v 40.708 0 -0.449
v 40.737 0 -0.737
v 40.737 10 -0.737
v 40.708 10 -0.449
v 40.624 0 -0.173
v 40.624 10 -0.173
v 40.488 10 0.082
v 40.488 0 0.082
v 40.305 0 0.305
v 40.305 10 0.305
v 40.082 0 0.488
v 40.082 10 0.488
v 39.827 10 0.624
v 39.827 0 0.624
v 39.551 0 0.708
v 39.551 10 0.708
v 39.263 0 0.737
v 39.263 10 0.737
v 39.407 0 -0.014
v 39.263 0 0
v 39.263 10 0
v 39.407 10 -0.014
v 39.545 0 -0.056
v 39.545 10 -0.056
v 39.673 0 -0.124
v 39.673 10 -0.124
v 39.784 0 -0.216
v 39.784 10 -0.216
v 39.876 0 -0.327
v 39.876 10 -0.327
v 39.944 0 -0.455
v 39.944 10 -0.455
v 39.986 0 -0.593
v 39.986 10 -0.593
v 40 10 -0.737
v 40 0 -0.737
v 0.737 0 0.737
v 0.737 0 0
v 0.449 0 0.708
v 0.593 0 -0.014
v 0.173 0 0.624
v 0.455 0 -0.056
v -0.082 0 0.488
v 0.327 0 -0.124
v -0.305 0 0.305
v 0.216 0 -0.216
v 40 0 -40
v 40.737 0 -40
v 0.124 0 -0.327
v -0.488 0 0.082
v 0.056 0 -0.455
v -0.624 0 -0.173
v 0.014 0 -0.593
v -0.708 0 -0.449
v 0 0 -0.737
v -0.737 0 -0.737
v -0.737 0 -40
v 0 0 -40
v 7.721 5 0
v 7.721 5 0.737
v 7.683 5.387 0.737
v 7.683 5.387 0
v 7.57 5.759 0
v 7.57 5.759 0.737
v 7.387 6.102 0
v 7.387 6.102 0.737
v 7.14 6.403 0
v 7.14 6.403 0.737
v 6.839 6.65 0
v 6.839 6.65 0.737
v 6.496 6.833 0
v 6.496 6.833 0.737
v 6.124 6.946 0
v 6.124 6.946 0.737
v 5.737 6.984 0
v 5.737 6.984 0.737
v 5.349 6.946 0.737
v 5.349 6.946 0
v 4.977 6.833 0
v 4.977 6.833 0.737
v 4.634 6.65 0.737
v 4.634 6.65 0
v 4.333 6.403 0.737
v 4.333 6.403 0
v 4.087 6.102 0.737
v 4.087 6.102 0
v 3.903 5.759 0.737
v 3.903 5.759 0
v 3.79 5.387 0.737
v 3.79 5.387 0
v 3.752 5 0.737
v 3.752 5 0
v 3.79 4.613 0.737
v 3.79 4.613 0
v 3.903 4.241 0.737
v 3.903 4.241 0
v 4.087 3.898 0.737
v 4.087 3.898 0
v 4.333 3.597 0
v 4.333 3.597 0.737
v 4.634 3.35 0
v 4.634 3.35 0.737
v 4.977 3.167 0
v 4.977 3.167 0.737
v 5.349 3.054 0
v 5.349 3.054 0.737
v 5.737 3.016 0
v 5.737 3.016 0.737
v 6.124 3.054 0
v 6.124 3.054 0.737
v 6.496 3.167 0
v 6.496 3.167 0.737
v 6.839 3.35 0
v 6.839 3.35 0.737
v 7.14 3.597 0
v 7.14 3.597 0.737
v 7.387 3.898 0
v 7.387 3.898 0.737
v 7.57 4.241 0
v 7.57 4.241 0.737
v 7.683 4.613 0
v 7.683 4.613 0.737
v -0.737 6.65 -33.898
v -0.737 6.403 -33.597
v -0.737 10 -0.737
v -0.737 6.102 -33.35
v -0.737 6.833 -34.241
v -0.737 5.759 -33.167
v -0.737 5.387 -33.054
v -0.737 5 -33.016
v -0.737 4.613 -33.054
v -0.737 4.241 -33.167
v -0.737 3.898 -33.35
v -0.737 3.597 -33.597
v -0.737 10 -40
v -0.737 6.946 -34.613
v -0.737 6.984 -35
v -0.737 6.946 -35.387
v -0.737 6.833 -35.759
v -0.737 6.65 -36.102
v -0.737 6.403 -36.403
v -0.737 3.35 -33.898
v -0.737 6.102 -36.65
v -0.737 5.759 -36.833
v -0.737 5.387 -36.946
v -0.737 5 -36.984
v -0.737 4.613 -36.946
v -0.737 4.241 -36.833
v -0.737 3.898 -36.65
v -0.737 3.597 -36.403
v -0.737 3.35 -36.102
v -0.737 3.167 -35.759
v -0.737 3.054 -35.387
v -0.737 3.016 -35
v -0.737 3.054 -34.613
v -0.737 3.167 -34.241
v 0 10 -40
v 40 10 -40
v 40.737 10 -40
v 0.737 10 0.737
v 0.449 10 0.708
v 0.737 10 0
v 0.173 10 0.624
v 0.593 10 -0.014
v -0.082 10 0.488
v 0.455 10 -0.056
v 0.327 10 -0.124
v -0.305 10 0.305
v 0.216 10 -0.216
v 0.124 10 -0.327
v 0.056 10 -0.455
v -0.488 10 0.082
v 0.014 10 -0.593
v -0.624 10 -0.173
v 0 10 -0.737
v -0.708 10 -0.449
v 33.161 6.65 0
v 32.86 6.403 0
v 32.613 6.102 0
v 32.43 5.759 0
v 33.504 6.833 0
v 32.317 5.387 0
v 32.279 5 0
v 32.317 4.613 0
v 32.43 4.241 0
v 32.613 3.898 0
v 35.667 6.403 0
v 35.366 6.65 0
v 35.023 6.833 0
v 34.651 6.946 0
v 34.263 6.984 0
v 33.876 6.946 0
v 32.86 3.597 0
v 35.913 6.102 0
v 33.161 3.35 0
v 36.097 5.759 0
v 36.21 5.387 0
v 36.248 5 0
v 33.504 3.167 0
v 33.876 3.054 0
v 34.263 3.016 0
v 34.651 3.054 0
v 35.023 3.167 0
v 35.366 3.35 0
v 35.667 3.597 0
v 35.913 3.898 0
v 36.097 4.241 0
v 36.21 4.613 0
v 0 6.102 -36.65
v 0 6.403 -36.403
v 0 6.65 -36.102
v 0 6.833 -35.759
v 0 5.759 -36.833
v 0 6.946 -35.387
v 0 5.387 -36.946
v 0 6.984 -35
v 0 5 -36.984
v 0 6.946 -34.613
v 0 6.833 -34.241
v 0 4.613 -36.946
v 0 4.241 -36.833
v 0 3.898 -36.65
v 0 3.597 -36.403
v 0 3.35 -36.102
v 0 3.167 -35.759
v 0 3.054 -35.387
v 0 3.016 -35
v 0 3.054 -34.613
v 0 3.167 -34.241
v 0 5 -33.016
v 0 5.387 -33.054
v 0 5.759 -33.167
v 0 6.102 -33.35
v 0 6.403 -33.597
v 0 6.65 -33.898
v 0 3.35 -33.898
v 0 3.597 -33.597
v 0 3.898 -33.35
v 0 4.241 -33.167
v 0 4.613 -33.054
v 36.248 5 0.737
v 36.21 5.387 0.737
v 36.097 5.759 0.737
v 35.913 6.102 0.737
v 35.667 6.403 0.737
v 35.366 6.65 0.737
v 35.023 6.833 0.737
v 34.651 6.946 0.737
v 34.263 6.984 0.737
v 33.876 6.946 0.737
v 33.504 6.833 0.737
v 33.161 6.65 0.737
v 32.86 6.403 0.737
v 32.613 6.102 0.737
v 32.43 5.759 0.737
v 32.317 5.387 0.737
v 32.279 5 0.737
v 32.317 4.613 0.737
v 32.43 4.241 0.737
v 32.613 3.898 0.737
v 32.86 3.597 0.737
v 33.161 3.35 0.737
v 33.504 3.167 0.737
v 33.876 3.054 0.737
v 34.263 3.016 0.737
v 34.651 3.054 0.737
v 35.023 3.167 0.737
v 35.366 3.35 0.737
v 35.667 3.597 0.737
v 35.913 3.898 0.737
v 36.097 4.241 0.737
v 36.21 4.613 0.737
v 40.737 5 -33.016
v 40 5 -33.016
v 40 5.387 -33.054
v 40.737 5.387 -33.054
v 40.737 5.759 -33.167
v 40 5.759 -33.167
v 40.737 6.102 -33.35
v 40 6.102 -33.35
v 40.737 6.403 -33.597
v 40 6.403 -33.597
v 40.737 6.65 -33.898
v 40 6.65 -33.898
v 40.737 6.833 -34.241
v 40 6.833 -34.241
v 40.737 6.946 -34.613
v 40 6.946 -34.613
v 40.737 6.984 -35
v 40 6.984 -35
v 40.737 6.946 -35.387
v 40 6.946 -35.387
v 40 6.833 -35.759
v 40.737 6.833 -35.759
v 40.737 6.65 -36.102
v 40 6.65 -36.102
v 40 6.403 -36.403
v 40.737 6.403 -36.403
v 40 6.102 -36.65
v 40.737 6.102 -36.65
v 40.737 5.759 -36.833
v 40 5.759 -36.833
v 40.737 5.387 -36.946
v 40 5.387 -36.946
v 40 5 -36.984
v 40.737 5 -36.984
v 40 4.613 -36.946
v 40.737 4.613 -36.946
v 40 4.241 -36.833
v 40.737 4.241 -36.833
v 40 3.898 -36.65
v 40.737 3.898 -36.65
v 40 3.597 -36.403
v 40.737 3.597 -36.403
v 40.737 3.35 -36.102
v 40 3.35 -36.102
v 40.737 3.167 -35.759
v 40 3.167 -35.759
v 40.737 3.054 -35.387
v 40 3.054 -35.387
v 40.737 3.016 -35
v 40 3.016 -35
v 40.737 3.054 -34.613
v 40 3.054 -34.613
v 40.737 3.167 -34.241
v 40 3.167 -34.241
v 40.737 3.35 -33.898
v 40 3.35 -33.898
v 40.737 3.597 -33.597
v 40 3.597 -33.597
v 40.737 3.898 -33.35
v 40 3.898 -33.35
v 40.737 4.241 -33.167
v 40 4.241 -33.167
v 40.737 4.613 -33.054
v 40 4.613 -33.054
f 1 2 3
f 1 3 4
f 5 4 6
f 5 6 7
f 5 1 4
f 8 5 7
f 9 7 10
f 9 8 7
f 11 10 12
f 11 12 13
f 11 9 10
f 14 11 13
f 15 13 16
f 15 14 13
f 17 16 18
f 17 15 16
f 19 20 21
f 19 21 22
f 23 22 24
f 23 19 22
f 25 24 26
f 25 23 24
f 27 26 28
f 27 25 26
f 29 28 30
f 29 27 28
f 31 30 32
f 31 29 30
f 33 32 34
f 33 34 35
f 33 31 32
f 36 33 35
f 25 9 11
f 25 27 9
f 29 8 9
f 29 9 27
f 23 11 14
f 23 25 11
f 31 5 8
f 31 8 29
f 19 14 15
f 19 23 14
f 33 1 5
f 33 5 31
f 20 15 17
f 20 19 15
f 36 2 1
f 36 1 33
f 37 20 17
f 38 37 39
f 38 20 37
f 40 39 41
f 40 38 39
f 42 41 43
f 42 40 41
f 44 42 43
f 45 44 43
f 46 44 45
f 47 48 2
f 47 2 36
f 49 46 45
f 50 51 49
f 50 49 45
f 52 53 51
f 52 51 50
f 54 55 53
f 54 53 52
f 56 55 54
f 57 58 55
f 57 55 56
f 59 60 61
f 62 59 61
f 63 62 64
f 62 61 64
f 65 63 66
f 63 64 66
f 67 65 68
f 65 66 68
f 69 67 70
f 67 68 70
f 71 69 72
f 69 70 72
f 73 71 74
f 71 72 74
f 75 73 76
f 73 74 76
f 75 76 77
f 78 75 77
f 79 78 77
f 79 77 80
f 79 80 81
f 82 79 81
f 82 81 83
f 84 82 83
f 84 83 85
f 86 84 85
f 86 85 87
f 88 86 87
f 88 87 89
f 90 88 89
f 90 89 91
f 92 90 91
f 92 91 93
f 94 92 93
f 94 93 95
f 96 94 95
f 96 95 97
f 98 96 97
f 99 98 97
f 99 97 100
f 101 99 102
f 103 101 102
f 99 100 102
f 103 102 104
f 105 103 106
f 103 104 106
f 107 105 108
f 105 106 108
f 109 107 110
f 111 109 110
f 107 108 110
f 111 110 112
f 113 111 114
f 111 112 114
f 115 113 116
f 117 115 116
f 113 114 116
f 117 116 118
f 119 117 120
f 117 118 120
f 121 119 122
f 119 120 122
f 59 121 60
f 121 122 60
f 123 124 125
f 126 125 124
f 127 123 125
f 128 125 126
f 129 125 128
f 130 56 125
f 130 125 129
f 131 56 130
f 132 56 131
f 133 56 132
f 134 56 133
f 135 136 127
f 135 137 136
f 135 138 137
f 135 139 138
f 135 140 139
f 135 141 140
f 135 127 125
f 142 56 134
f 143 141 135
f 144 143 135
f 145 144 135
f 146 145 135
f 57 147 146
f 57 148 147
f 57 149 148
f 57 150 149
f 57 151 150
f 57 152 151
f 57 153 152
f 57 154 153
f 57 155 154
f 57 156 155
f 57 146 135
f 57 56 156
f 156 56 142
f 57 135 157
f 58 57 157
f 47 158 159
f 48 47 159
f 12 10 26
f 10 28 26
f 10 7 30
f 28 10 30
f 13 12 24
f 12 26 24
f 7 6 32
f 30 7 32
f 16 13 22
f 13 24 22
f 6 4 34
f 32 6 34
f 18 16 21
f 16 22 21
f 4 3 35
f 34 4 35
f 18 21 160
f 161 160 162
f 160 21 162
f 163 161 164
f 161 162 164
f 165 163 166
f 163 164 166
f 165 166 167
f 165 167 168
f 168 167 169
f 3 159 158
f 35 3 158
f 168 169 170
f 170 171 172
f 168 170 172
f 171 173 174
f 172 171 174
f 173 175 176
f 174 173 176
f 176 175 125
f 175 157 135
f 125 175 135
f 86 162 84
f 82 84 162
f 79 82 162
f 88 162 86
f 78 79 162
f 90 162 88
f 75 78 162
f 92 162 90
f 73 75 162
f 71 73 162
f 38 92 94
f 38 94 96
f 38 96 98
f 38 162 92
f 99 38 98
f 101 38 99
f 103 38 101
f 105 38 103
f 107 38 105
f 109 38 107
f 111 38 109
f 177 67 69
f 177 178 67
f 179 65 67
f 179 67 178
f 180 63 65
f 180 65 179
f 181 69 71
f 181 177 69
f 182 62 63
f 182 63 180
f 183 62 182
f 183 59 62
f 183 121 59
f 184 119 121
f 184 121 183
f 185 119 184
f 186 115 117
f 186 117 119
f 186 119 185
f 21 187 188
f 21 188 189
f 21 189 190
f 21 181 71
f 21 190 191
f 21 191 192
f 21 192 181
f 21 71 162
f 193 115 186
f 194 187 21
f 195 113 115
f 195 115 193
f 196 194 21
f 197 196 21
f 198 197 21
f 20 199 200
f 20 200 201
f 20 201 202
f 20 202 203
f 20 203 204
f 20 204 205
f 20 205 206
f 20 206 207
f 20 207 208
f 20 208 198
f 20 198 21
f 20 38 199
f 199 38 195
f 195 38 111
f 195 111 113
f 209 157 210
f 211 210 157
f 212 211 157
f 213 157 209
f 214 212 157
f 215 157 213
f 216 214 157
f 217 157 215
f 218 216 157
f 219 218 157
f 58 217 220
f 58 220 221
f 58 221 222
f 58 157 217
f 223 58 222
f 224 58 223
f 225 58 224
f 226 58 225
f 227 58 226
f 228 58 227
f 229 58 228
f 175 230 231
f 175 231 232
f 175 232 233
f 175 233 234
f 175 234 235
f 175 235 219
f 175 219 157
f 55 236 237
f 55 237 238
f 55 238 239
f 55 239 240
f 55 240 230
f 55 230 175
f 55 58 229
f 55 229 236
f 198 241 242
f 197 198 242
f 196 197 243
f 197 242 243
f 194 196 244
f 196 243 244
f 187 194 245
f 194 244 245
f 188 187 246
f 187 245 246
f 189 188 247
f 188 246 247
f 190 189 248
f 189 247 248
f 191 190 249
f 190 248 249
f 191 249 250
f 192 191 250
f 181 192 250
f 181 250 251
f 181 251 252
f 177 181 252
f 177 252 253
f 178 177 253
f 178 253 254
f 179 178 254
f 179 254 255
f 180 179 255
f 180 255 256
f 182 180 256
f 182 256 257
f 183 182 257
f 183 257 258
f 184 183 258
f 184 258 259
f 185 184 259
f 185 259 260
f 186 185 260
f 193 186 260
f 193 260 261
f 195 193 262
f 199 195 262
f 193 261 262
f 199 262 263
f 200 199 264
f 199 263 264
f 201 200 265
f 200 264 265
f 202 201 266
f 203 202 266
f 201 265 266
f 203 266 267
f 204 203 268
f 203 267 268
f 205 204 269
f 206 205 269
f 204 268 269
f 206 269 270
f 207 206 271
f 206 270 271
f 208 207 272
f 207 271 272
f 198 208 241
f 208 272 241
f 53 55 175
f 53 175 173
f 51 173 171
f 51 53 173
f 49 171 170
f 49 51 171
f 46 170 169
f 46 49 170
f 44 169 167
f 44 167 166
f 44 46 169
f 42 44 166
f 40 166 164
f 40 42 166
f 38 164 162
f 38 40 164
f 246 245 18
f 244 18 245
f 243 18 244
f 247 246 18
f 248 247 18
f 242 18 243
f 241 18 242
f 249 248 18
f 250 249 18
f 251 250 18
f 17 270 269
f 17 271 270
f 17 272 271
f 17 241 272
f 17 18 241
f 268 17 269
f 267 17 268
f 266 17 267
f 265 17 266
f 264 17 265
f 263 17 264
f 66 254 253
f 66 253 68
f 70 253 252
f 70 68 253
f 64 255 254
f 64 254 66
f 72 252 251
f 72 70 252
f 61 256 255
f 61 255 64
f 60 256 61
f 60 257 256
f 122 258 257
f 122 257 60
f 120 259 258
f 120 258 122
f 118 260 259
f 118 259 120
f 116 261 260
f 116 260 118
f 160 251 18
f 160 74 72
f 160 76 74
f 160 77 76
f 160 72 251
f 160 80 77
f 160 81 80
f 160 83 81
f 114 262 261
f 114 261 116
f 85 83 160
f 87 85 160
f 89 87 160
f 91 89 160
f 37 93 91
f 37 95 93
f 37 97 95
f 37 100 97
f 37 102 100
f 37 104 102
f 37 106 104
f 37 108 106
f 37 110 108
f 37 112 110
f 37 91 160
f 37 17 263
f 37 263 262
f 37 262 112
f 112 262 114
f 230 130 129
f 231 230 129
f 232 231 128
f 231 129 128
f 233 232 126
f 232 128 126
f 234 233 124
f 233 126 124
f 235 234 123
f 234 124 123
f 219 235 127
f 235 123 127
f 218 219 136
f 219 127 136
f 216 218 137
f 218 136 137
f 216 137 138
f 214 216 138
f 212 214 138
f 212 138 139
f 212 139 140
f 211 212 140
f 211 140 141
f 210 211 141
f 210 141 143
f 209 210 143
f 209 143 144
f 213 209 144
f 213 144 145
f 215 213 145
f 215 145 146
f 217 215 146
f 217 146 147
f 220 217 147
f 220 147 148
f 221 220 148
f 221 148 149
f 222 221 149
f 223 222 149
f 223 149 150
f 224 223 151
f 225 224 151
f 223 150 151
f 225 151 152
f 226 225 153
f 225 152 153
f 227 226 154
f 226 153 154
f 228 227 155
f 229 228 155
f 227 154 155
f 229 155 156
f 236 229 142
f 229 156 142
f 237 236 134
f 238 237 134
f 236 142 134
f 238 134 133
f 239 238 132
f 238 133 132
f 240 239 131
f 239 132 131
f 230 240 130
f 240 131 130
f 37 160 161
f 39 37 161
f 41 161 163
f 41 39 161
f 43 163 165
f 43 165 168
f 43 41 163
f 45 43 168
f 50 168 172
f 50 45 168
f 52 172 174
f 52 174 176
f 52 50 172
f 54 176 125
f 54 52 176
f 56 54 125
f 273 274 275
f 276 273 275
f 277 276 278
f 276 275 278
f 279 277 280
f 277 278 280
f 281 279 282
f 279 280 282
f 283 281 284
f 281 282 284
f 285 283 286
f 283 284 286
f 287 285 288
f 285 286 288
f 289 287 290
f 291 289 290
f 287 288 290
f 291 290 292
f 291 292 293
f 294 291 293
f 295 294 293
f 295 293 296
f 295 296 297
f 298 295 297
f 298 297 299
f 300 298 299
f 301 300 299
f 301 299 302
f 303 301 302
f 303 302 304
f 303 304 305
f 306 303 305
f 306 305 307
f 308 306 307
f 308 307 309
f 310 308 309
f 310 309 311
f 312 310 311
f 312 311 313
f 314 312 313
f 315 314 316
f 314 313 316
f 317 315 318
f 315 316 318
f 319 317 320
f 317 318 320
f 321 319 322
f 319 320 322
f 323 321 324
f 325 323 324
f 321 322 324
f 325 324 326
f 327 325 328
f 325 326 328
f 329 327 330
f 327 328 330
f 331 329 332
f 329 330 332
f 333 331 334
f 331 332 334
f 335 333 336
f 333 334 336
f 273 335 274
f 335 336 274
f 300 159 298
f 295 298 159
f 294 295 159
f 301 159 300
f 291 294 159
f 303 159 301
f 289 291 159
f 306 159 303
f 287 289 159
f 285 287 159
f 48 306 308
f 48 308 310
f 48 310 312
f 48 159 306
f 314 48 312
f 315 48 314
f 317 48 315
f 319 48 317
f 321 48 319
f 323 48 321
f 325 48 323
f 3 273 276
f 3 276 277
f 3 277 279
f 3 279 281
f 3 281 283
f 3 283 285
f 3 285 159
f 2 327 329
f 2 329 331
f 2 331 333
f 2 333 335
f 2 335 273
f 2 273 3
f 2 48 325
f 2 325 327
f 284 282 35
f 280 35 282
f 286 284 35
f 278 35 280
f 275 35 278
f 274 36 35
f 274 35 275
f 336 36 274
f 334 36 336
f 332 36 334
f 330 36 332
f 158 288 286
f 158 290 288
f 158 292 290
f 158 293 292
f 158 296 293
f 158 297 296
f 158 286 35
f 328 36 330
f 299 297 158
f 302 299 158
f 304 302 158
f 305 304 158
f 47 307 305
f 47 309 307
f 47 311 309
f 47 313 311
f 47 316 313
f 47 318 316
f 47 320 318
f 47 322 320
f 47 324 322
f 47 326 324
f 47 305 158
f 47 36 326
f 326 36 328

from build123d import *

# Parameters (mm, degrees)
BASE_FLANGE1_DEPTH = 10
SKETCH6_R          = 1.984375
CUT_EXTRUDE1_DEPTH = 10
SKETCH7_R          = 1.984375
CUT_EXTRUDE2_DEPTH = 59.480991085


# Sheet-metal steps are written as plain solids
with BuildPart() as part:
    # Sketch1 → Base-Flange1 (new body)
    with BuildSketch(Plane(origin=(0, 0, 0), x_dir=(1, 0, 0), z_dir=(0, 1, 0))):
        with BuildLine():
            Line((0, 40), (0, 0.7366))
            ThreePointArc((0, 0.7366), (0.215745145, 0.215745145), (0.7366, 0))
            Line((0.7366, 0), (39.2634, 0))
            ThreePointArc((39.2634, 0), (39.784254855, 0.215745145), (40, 0.7366))
            Line((40, 0.7366), (40, 40))
            Line((40, 40), (40.7366, 40))
            Line((40.7366, 40), (40.7366, 0.7366))
            ThreePointArc((40.7366, 0.7366), (40.30510971, -0.30510971), (39.2634, -0.7366))
            Line((39.2634, -0.7366), (0.7366, -0.7366))
            ThreePointArc((0.7366, -0.7366), (-0.30510971, -0.30510971), (-0.7366, 0.7366))
            Line((-0.7366, 0.7366), (-0.7366, 40))
            Line((-0.7366, 40), (0, 40))
        make_face()
    extrude(amount=BASE_FLANGE1_DEPTH)

    # Sketch6 → Cut-Extrude1 (cut)
    with BuildSketch(Plane.XY.offset(0.7366)):
        with Locations((5.7366, 5)):
            Circle(SKETCH6_R)
        with Locations((34.2634, 5)):
            Circle(SKETCH6_R)
    extrude(amount=-CUT_EXTRUDE1_DEPTH, mode=Mode.SUBTRACT)

    # Sketch7 → Cut-Extrude2 (cut, through all)
    with BuildSketch(Plane.ZY.offset(0.7366)):
        with Locations((-35, 5)):
            Circle(SKETCH7_R)
    extrude(amount=-CUT_EXTRUDE2_DEPTH, mode=Mode.SUBTRACT)


solid = part.part
